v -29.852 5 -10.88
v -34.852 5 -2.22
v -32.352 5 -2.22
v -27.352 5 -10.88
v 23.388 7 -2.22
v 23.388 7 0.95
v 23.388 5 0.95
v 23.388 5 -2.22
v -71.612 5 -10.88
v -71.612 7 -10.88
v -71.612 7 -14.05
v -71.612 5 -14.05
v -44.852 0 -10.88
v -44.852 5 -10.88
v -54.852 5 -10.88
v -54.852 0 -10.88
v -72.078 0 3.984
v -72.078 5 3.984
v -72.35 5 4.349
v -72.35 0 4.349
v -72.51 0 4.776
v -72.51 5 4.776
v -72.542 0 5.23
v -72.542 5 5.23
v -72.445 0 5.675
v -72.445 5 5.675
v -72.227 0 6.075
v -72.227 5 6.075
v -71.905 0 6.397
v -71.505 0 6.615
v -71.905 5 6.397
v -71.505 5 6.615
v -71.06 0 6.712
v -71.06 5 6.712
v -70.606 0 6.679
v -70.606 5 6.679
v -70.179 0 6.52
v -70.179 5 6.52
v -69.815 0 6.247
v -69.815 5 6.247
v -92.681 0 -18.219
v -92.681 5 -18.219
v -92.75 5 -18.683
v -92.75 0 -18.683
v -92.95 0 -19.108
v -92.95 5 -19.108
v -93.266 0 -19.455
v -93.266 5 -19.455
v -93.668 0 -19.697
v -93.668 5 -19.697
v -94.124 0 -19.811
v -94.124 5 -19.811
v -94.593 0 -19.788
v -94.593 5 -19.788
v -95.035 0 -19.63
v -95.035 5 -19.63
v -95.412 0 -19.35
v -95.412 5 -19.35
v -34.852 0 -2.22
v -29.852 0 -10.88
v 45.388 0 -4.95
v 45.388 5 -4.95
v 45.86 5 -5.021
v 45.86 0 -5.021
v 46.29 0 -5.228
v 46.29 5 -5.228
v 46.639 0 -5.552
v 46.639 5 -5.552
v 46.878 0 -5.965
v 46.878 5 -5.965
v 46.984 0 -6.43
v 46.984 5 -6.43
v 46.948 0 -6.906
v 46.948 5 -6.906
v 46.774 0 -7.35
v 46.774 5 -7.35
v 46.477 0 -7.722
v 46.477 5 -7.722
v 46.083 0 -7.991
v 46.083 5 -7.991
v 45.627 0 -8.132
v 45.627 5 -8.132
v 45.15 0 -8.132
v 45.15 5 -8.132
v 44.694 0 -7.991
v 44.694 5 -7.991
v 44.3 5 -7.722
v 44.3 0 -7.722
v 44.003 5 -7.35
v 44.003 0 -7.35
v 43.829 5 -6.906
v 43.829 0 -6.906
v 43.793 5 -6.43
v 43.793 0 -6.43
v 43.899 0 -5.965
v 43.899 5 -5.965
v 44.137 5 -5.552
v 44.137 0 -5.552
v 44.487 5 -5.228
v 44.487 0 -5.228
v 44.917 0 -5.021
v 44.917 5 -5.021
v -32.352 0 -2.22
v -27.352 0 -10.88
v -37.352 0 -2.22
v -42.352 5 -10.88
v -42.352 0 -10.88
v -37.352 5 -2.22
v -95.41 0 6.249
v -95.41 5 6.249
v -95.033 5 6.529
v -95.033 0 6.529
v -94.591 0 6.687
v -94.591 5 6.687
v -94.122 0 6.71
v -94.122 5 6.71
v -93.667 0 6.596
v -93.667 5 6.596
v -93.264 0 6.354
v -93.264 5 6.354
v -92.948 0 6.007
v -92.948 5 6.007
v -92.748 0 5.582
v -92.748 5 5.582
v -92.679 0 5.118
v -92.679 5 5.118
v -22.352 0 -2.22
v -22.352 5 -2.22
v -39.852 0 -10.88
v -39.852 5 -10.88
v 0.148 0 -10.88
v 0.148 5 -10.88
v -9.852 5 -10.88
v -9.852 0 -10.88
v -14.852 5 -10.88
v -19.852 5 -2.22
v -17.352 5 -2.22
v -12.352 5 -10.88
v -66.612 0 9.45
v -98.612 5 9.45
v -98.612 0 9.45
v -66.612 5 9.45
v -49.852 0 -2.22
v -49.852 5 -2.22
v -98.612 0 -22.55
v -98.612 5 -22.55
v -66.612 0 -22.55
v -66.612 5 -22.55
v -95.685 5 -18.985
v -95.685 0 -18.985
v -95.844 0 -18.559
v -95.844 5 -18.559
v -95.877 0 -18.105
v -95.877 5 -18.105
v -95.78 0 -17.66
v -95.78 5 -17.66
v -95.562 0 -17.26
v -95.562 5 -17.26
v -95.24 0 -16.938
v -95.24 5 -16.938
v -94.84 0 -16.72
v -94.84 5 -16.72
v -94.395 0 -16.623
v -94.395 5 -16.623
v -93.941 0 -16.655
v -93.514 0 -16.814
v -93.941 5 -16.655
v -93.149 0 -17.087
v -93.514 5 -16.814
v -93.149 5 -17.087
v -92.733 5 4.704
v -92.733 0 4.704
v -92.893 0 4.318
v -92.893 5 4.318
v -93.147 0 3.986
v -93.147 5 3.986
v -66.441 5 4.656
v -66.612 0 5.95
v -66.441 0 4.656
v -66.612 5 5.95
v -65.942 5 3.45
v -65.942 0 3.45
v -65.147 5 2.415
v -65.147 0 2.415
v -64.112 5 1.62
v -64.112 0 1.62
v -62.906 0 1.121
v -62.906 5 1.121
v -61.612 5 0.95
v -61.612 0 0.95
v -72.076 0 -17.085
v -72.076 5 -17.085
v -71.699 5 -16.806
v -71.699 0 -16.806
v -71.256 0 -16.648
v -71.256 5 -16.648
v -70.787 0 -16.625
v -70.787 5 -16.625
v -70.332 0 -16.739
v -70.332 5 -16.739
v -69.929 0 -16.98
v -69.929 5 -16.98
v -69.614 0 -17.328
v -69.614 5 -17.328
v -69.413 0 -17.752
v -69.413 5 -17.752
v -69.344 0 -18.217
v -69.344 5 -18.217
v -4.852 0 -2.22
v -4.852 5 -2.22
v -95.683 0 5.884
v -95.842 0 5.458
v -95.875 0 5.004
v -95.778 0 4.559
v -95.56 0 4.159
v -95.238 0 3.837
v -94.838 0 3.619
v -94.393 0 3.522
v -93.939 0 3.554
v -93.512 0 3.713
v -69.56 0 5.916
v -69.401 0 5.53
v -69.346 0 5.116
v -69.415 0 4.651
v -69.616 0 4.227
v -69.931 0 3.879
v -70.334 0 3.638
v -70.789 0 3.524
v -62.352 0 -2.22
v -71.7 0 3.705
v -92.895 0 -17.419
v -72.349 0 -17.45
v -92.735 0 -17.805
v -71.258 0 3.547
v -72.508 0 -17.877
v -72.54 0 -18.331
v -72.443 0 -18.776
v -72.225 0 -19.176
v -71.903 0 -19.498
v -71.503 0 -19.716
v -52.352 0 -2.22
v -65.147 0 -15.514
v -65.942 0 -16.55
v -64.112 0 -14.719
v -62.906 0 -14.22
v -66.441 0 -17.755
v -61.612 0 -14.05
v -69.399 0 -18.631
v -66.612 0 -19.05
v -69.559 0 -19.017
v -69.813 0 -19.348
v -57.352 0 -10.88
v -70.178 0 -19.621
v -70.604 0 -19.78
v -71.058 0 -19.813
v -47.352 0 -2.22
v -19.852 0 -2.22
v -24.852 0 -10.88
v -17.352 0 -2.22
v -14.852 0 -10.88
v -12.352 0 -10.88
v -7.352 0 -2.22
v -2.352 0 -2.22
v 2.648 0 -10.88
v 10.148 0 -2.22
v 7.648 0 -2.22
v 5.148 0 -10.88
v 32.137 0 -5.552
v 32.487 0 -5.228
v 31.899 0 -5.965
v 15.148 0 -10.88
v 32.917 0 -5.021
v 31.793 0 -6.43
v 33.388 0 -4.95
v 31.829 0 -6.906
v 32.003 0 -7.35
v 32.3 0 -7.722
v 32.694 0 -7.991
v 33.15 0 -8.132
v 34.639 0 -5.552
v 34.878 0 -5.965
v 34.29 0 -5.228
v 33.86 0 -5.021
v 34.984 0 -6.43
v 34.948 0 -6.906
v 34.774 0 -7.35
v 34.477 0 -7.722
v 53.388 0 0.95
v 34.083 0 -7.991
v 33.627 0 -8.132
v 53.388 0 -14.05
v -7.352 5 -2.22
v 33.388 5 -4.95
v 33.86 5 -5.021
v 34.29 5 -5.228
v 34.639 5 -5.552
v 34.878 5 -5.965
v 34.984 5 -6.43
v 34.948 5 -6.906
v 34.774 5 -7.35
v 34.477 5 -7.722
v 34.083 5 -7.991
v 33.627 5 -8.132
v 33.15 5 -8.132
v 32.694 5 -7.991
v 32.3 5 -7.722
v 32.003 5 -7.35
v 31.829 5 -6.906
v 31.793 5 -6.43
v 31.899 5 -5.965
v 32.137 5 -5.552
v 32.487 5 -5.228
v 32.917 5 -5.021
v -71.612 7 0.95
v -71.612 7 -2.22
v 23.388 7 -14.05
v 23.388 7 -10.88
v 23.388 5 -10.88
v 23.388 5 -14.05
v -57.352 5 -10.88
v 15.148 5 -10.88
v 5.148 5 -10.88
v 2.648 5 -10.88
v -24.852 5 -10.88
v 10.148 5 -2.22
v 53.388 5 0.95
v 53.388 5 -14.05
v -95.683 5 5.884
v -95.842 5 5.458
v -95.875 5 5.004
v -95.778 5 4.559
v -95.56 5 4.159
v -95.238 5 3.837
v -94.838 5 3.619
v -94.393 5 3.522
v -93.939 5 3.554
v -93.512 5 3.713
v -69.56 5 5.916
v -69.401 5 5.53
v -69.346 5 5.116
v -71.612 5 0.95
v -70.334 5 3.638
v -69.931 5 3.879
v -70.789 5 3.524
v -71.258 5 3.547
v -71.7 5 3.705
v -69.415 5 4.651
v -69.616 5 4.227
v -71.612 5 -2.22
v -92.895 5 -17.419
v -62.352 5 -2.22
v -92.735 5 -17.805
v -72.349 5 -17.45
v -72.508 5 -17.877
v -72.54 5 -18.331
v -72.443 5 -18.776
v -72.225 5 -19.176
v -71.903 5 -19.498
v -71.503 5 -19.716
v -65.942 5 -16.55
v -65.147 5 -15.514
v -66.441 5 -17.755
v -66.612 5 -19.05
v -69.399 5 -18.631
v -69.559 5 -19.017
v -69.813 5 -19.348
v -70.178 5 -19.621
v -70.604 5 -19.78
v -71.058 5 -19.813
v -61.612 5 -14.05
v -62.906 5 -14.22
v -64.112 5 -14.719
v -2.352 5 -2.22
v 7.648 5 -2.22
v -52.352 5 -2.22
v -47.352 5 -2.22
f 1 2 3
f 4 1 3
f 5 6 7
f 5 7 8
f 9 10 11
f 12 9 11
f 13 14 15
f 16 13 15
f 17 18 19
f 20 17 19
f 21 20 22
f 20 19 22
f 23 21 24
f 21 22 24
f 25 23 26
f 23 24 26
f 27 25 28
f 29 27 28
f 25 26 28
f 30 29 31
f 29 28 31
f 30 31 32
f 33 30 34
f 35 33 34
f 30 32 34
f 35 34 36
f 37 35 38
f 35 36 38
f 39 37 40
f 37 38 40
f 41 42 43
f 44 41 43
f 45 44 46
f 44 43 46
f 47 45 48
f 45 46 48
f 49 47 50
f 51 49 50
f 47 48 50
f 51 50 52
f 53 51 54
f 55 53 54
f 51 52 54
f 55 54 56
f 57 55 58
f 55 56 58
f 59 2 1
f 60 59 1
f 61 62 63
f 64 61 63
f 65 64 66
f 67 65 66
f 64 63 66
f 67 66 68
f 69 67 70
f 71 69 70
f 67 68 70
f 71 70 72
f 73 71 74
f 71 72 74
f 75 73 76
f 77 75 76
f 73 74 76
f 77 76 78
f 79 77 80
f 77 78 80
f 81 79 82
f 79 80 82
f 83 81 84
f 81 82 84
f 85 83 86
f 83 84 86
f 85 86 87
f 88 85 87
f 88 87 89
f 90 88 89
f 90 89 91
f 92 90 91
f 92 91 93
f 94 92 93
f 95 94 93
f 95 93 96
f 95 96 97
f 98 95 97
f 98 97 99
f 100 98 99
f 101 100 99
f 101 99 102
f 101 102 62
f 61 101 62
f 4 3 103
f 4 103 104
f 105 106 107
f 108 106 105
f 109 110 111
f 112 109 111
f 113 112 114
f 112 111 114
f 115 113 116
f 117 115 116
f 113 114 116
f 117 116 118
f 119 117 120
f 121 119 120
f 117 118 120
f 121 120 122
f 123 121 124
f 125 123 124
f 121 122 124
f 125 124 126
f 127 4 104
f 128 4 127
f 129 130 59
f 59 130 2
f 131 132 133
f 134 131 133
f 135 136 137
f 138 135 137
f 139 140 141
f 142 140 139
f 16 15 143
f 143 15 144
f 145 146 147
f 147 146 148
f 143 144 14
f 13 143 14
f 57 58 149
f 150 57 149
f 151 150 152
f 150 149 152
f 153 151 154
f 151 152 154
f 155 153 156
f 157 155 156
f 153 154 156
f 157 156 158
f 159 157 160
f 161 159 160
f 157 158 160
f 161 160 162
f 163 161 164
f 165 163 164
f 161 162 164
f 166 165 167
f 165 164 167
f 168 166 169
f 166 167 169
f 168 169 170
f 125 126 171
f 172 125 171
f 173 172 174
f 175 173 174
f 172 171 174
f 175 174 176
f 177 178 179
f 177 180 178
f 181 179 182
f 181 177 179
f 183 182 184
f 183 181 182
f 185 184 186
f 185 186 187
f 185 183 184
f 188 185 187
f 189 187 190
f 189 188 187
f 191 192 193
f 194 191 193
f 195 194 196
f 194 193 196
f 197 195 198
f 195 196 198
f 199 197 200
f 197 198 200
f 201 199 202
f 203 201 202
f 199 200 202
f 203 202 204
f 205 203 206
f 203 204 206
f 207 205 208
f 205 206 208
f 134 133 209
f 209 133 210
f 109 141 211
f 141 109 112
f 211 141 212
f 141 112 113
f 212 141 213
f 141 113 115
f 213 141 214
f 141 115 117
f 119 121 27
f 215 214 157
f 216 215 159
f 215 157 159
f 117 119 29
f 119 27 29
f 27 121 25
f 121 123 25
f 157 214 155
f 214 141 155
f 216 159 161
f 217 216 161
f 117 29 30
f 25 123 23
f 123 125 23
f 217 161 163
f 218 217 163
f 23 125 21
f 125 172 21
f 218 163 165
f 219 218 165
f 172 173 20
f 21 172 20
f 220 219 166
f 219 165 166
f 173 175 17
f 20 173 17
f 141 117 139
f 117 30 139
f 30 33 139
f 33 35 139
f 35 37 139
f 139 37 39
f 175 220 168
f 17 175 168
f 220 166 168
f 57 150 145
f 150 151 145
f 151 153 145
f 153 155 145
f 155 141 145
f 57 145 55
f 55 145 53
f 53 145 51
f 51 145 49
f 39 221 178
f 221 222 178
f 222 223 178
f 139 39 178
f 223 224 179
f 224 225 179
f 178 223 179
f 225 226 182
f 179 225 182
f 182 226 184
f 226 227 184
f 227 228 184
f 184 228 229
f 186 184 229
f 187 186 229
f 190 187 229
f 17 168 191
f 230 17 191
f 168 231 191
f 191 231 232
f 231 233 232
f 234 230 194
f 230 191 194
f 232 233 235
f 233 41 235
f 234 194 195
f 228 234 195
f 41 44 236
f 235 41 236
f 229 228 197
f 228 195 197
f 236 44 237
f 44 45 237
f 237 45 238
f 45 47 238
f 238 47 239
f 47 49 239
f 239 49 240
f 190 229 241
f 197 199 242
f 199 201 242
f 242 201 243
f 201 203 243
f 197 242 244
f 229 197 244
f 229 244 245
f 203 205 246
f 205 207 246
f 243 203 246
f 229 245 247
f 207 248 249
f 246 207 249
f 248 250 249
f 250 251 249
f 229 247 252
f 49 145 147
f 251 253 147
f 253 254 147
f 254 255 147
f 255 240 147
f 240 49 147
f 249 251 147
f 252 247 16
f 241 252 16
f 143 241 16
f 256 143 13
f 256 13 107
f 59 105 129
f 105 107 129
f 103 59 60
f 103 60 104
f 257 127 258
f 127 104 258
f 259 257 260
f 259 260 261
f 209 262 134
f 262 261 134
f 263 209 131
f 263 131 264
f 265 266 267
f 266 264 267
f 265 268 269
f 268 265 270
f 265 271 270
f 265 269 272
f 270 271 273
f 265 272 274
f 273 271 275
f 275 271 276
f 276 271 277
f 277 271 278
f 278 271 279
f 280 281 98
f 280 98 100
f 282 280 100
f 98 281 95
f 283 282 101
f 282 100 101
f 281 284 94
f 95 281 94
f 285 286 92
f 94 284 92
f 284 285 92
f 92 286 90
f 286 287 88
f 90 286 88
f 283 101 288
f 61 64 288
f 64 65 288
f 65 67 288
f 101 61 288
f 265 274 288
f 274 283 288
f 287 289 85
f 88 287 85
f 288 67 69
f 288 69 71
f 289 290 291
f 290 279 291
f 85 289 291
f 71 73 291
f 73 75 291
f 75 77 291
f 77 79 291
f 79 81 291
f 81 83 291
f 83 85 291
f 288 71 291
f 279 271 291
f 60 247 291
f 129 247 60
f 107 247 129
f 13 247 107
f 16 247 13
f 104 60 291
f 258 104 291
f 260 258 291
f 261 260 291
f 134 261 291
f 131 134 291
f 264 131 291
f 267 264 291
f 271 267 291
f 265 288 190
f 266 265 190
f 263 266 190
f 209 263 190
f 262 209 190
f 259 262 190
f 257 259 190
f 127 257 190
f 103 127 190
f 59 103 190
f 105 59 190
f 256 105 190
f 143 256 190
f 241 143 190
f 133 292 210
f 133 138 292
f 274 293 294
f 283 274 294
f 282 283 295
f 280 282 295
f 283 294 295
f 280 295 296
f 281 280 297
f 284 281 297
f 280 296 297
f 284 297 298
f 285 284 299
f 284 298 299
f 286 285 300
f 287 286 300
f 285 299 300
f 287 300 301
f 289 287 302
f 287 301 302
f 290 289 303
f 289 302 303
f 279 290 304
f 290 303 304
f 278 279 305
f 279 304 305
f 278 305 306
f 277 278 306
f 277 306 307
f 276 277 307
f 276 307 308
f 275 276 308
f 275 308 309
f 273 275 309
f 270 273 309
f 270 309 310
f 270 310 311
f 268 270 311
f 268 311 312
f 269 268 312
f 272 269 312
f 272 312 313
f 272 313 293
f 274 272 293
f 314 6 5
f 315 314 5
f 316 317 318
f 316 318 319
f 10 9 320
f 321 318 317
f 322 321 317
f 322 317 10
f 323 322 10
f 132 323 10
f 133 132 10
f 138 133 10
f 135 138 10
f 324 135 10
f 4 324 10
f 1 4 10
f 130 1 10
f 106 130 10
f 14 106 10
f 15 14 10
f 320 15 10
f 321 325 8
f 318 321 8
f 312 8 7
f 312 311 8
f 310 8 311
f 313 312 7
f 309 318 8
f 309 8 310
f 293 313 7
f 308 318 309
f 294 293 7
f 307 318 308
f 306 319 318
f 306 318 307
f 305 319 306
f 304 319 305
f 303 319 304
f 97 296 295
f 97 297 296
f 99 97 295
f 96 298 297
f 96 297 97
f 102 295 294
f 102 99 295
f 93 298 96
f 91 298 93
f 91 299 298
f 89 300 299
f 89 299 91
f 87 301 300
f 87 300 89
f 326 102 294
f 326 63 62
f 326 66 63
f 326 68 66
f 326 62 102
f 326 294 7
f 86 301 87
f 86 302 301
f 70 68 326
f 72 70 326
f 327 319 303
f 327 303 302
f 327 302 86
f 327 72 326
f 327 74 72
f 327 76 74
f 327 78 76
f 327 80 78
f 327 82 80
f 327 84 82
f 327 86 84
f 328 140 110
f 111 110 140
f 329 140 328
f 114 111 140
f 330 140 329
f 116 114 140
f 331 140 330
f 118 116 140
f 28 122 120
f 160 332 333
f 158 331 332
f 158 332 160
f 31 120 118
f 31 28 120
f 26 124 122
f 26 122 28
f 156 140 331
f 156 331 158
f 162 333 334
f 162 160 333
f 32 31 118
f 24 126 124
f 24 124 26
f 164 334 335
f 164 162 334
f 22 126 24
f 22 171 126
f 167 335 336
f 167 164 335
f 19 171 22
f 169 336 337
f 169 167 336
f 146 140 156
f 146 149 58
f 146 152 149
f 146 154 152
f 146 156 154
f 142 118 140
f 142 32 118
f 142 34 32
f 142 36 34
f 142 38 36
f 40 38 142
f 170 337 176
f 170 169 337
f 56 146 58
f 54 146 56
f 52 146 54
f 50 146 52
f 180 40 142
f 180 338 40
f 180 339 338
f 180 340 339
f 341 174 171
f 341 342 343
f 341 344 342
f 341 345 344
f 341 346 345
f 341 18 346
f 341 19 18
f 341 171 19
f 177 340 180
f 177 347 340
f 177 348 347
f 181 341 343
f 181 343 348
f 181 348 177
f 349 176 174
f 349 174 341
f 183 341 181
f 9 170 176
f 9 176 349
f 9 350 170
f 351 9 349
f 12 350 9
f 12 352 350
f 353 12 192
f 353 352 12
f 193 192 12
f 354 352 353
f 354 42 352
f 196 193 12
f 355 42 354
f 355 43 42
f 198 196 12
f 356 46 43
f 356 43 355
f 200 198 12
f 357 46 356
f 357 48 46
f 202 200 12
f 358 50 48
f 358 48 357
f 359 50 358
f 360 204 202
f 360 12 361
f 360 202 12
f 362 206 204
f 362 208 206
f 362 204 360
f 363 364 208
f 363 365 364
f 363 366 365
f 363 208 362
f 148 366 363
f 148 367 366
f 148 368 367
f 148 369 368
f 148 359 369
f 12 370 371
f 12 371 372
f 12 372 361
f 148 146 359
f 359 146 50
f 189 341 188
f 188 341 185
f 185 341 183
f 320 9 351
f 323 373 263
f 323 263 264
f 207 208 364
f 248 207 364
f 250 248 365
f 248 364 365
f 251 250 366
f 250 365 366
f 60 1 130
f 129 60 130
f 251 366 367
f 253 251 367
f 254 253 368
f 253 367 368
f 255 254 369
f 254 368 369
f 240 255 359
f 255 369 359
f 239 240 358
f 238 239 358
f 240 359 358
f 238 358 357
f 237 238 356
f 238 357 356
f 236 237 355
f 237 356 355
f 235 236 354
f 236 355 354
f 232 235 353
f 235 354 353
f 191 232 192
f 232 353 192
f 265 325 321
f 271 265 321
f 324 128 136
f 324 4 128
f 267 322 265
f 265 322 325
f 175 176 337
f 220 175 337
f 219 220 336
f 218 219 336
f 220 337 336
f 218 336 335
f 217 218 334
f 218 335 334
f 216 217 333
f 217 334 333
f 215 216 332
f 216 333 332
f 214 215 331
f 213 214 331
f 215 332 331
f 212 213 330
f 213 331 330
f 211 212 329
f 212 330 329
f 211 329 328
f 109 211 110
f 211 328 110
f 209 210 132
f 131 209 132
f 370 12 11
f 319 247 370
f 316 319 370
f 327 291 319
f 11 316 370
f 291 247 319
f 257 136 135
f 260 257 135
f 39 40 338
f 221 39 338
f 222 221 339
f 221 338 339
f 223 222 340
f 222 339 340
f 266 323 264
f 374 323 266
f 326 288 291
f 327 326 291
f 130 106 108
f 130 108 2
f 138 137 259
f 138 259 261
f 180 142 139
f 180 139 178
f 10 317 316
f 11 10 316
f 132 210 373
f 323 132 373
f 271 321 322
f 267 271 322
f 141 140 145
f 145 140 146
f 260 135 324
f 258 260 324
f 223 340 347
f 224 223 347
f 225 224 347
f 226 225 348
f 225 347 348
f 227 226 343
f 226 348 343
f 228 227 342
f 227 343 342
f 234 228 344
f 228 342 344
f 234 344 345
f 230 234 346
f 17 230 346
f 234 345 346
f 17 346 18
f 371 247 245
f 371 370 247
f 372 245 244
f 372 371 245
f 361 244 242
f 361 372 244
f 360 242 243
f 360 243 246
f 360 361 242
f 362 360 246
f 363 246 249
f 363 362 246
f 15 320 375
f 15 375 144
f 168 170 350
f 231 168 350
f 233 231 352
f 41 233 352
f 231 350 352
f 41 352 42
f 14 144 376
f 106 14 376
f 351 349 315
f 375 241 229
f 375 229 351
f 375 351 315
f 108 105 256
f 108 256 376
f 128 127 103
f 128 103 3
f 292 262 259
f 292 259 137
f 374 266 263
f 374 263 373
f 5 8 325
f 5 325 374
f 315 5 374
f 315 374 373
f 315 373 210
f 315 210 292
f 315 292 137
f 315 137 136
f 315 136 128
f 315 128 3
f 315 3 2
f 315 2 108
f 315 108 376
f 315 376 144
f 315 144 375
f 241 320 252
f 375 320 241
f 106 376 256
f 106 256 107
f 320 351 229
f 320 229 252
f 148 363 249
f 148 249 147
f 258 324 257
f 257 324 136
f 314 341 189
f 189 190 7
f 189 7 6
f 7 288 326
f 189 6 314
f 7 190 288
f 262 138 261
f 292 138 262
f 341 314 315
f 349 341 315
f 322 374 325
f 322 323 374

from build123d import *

# Parameters (mm, degrees)
SKETCH_1_W          = 120
SKETCH_1_H          = 15
EXTRUDE_1_DEPTH     = 5
SKETCH_2_R          = 1.6
CUT_EXTRUDE_1_DEPTH = 10
SKETCH_3_W          = 32
SKETCH_3_H          = 32
EXTRUDE_2_DEPTH     = 5
CUT_EXTRUDE_2_DEPTH = 7.5
FILLET_2_R          = 5
FILLET_4_R          = 5
CUT_EXTRUDE_3_DEPTH = 10
SKETCH_12_W         = 3.17
SKETCH_12_H         = 2
EXTRUDE_4_DEPTH     = 95


with BuildPart() as part:
    # Эскиз1 → Бобышка-Вытянуть1 (new body)
    with BuildSketch(Plane(origin=(0, 0, 0), x_dir=(1, 0, 0), z_dir=(0, 1, 0))):
        with Locations((-6.611570248, 6.549586777)):
            Rectangle(SKETCH_1_W, SKETCH_1_H)
    extrude(amount=EXTRUDE_1_DEPTH)

    # Эскиз2 → Вырез-Вытянуть1 (cut)
    with BuildSketch(Plane(origin=(0, 5, 0), x_dir=(1, 0, 0), z_dir=(0, 1, 0))):
        with Locations(Location((45.388429752, 6.549586777, 0), (0, 0, 270))):
            Circle(SKETCH_2_R)
        with Locations(Location((33.388429752, 6.549586777, 0), (0, 0, 270))):
            Circle(SKETCH_2_R)
    extrude(amount=-CUT_EXTRUDE_1_DEPTH, mode=Mode.SUBTRACT)

    # Эскиз3 → Бобышка-Вытянуть2 (add)
    with BuildSketch(Plane(origin=(0, 5, 0), x_dir=(1, 0, 0), z_dir=(0, 1, 0))):
        with Locations((-82.611570248, 6.549586777)):
            Rectangle(SKETCH_3_W, SKETCH_3_H)
    extrude(amount=-EXTRUDE_2_DEPTH)

    # Эскиз4 → Вырез-Вытянуть2 (cut)
    with BuildSketch(Plane(origin=(0, 5, 0), x_dir=(1, 0, 0), z_dir=(0, 1, 0))):
        with BuildLine():
            ThreePointArc((-95.412029446, 19.350045975), (-95.412029446, 17.087304275), (-93.149287746, 17.087304275))
            Line((-93.149287746, 17.087304275), (-95.412029446, 19.350045975))
        make_face()
        with BuildLine():
            Line((-95.412029446, 19.350045975), (-93.149287746, 17.087304275))
            ThreePointArc((-93.149287746, 17.087304275), (-92.802451344, 17.606381633), (-92.680658596, 18.218675125))
            ThreePointArc((-92.680658596, 18.218675125), (-93.668365104, 19.696882377), (-95.412029446, 19.350045975))
        make_face()
        with BuildLine():
            ThreePointArc((-69.812937508, 19.348219516), (-72.075679208, 19.348219516), (-72.075679208, 17.085477817))
            Line((-72.075679208, 17.085477817), (-69.812937508, 19.348219516))
        make_face()
        with BuildLine():
            Line((-69.812937508, 19.348219516), (-72.075679208, 17.085477817))
            ThreePointArc((-72.075679208, 17.085477817), (-70.332014867, 16.738641414), (-69.344308358, 18.216848666))
            ThreePointArc((-69.344308358, 18.216848666), (-69.466101106, 18.829142158), (-69.812937508, 19.348219516))
        make_face()
        with BuildLine():
            ThreePointArc((-93.147461288, -3.986304263), (-95.410202987, -3.986304263), (-95.410202987, -6.249045963))
            Line((-95.410202987, -6.249045963), (-93.147461288, -3.986304263))
        make_face()
        with BuildLine():
            Line((-93.147461288, -3.986304263), (-95.410202987, -6.249045963))
            ThreePointArc((-95.410202987, -6.249045963), (-93.666538646, -6.595882365), (-92.678832138, -5.117675113))
            ThreePointArc((-92.678832138, -5.117675113), (-92.800624885, -4.505381621), (-93.147461288, -3.986304263))
        make_face()
        with BuildLine():
            ThreePointArc((-69.346134817, -5.115848654), (-70.333841325, -3.637641402), (-72.077505667, -3.984477805))
            Line((-72.077505667, -3.984477805), (-69.814763967, -6.247219504))
            ThreePointArc((-69.814763967, -6.247219504), (-69.467927565, -5.728142146), (-69.346134817, -5.115848654))
        make_face()
        with BuildLine():
            Line((-69.814763967, -6.247219504), (-72.077505667, -3.984477805))
            ThreePointArc((-72.077505667, -3.984477805), (-72.077505667, -6.247219504), (-69.814763967, -6.247219504))
        make_face()
    extrude(amount=-CUT_EXTRUDE_2_DEPTH, mode=Mode.SUBTRACT)

    # Скругление2
    fillet_2_edges = [part.edges().sort_by_distance(p)[0] for p in [
        (-66.611570248, 2.5, 0.950413223),
    ]]
    fillet(fillet_2_edges, radius=FILLET_2_R)

    # Скругление4
    fillet_4_edges = [part.edges().sort_by_distance(p)[0] for p in [
        (-66.611570248, 2.5, -14.049586777),
    ]]
    fillet(fillet_4_edges, radius=FILLET_4_R)

    # Эскиз6 → Вырез-Вытянуть3 (cut)
    with BuildSketch(Plane(origin=(0, 5, 0), x_dir=(1, 0, 0), z_dir=(0, 1, 0))):
        Polygon((-62.351737512, 2.219586777), (-57.351737512, 10.879840815), (-52.351737512, 2.219586777), align=None)
        Polygon((-47.351737512, 2.219586777), (-42.351737512, 10.879840815), (-37.351737512, 2.219586777), align=None)
        Polygon((-32.351737512, 2.219586777), (-27.351737512, 10.879840815), (-22.351737512, 2.219586777), align=None)
        Polygon((-17.351737512, 2.219586777), (-12.351737512, 10.879840815), (-7.351737512, 2.219586777), align=None)
        Polygon((-2.351737512, 2.219586777), (2.648262488, 10.879840815), (7.648262488, 2.219586777), align=None)
        Polygon((-54.851737512, 10.879840815), (-49.851737512, 2.219586777), (-44.851737512, 10.879840815), align=None)
        Polygon((-39.851737512, 10.879840815), (-34.851737512, 2.219586777), (-29.851737512, 10.879840815), align=None)
        Polygon((-24.851737512, 10.879840815), (-19.851737512, 2.219586777), (-14.851737512, 10.879840815), align=None)
        Polygon((-9.851737512, 10.879840815), (-4.851737512, 2.219586777), (0.148262488, 10.879840815), align=None)
        Polygon((5.148262488, 10.879840815), (10.148262488, 2.219586777), (15.148262488, 10.879840815), align=None)
    extrude(amount=-CUT_EXTRUDE_3_DEPTH, mode=Mode.SUBTRACT)

    # Эскиз12 → Бобышка-Вытянуть4 (add)
    with BuildSketch(Plane(origin=(23.388429752, 0, 0), x_dir=(0, 0, -1), z_dir=(1, 0, 0))):
        with Locations((0.634586777, 6)):
            Rectangle(SKETCH_12_W, SKETCH_12_H)
        with Locations((12.464586777, 6)):
            Rectangle(SKETCH_12_W, SKETCH_12_H)
    extrude(amount=-EXTRUDE_4_DEPTH)


solid = part.part
